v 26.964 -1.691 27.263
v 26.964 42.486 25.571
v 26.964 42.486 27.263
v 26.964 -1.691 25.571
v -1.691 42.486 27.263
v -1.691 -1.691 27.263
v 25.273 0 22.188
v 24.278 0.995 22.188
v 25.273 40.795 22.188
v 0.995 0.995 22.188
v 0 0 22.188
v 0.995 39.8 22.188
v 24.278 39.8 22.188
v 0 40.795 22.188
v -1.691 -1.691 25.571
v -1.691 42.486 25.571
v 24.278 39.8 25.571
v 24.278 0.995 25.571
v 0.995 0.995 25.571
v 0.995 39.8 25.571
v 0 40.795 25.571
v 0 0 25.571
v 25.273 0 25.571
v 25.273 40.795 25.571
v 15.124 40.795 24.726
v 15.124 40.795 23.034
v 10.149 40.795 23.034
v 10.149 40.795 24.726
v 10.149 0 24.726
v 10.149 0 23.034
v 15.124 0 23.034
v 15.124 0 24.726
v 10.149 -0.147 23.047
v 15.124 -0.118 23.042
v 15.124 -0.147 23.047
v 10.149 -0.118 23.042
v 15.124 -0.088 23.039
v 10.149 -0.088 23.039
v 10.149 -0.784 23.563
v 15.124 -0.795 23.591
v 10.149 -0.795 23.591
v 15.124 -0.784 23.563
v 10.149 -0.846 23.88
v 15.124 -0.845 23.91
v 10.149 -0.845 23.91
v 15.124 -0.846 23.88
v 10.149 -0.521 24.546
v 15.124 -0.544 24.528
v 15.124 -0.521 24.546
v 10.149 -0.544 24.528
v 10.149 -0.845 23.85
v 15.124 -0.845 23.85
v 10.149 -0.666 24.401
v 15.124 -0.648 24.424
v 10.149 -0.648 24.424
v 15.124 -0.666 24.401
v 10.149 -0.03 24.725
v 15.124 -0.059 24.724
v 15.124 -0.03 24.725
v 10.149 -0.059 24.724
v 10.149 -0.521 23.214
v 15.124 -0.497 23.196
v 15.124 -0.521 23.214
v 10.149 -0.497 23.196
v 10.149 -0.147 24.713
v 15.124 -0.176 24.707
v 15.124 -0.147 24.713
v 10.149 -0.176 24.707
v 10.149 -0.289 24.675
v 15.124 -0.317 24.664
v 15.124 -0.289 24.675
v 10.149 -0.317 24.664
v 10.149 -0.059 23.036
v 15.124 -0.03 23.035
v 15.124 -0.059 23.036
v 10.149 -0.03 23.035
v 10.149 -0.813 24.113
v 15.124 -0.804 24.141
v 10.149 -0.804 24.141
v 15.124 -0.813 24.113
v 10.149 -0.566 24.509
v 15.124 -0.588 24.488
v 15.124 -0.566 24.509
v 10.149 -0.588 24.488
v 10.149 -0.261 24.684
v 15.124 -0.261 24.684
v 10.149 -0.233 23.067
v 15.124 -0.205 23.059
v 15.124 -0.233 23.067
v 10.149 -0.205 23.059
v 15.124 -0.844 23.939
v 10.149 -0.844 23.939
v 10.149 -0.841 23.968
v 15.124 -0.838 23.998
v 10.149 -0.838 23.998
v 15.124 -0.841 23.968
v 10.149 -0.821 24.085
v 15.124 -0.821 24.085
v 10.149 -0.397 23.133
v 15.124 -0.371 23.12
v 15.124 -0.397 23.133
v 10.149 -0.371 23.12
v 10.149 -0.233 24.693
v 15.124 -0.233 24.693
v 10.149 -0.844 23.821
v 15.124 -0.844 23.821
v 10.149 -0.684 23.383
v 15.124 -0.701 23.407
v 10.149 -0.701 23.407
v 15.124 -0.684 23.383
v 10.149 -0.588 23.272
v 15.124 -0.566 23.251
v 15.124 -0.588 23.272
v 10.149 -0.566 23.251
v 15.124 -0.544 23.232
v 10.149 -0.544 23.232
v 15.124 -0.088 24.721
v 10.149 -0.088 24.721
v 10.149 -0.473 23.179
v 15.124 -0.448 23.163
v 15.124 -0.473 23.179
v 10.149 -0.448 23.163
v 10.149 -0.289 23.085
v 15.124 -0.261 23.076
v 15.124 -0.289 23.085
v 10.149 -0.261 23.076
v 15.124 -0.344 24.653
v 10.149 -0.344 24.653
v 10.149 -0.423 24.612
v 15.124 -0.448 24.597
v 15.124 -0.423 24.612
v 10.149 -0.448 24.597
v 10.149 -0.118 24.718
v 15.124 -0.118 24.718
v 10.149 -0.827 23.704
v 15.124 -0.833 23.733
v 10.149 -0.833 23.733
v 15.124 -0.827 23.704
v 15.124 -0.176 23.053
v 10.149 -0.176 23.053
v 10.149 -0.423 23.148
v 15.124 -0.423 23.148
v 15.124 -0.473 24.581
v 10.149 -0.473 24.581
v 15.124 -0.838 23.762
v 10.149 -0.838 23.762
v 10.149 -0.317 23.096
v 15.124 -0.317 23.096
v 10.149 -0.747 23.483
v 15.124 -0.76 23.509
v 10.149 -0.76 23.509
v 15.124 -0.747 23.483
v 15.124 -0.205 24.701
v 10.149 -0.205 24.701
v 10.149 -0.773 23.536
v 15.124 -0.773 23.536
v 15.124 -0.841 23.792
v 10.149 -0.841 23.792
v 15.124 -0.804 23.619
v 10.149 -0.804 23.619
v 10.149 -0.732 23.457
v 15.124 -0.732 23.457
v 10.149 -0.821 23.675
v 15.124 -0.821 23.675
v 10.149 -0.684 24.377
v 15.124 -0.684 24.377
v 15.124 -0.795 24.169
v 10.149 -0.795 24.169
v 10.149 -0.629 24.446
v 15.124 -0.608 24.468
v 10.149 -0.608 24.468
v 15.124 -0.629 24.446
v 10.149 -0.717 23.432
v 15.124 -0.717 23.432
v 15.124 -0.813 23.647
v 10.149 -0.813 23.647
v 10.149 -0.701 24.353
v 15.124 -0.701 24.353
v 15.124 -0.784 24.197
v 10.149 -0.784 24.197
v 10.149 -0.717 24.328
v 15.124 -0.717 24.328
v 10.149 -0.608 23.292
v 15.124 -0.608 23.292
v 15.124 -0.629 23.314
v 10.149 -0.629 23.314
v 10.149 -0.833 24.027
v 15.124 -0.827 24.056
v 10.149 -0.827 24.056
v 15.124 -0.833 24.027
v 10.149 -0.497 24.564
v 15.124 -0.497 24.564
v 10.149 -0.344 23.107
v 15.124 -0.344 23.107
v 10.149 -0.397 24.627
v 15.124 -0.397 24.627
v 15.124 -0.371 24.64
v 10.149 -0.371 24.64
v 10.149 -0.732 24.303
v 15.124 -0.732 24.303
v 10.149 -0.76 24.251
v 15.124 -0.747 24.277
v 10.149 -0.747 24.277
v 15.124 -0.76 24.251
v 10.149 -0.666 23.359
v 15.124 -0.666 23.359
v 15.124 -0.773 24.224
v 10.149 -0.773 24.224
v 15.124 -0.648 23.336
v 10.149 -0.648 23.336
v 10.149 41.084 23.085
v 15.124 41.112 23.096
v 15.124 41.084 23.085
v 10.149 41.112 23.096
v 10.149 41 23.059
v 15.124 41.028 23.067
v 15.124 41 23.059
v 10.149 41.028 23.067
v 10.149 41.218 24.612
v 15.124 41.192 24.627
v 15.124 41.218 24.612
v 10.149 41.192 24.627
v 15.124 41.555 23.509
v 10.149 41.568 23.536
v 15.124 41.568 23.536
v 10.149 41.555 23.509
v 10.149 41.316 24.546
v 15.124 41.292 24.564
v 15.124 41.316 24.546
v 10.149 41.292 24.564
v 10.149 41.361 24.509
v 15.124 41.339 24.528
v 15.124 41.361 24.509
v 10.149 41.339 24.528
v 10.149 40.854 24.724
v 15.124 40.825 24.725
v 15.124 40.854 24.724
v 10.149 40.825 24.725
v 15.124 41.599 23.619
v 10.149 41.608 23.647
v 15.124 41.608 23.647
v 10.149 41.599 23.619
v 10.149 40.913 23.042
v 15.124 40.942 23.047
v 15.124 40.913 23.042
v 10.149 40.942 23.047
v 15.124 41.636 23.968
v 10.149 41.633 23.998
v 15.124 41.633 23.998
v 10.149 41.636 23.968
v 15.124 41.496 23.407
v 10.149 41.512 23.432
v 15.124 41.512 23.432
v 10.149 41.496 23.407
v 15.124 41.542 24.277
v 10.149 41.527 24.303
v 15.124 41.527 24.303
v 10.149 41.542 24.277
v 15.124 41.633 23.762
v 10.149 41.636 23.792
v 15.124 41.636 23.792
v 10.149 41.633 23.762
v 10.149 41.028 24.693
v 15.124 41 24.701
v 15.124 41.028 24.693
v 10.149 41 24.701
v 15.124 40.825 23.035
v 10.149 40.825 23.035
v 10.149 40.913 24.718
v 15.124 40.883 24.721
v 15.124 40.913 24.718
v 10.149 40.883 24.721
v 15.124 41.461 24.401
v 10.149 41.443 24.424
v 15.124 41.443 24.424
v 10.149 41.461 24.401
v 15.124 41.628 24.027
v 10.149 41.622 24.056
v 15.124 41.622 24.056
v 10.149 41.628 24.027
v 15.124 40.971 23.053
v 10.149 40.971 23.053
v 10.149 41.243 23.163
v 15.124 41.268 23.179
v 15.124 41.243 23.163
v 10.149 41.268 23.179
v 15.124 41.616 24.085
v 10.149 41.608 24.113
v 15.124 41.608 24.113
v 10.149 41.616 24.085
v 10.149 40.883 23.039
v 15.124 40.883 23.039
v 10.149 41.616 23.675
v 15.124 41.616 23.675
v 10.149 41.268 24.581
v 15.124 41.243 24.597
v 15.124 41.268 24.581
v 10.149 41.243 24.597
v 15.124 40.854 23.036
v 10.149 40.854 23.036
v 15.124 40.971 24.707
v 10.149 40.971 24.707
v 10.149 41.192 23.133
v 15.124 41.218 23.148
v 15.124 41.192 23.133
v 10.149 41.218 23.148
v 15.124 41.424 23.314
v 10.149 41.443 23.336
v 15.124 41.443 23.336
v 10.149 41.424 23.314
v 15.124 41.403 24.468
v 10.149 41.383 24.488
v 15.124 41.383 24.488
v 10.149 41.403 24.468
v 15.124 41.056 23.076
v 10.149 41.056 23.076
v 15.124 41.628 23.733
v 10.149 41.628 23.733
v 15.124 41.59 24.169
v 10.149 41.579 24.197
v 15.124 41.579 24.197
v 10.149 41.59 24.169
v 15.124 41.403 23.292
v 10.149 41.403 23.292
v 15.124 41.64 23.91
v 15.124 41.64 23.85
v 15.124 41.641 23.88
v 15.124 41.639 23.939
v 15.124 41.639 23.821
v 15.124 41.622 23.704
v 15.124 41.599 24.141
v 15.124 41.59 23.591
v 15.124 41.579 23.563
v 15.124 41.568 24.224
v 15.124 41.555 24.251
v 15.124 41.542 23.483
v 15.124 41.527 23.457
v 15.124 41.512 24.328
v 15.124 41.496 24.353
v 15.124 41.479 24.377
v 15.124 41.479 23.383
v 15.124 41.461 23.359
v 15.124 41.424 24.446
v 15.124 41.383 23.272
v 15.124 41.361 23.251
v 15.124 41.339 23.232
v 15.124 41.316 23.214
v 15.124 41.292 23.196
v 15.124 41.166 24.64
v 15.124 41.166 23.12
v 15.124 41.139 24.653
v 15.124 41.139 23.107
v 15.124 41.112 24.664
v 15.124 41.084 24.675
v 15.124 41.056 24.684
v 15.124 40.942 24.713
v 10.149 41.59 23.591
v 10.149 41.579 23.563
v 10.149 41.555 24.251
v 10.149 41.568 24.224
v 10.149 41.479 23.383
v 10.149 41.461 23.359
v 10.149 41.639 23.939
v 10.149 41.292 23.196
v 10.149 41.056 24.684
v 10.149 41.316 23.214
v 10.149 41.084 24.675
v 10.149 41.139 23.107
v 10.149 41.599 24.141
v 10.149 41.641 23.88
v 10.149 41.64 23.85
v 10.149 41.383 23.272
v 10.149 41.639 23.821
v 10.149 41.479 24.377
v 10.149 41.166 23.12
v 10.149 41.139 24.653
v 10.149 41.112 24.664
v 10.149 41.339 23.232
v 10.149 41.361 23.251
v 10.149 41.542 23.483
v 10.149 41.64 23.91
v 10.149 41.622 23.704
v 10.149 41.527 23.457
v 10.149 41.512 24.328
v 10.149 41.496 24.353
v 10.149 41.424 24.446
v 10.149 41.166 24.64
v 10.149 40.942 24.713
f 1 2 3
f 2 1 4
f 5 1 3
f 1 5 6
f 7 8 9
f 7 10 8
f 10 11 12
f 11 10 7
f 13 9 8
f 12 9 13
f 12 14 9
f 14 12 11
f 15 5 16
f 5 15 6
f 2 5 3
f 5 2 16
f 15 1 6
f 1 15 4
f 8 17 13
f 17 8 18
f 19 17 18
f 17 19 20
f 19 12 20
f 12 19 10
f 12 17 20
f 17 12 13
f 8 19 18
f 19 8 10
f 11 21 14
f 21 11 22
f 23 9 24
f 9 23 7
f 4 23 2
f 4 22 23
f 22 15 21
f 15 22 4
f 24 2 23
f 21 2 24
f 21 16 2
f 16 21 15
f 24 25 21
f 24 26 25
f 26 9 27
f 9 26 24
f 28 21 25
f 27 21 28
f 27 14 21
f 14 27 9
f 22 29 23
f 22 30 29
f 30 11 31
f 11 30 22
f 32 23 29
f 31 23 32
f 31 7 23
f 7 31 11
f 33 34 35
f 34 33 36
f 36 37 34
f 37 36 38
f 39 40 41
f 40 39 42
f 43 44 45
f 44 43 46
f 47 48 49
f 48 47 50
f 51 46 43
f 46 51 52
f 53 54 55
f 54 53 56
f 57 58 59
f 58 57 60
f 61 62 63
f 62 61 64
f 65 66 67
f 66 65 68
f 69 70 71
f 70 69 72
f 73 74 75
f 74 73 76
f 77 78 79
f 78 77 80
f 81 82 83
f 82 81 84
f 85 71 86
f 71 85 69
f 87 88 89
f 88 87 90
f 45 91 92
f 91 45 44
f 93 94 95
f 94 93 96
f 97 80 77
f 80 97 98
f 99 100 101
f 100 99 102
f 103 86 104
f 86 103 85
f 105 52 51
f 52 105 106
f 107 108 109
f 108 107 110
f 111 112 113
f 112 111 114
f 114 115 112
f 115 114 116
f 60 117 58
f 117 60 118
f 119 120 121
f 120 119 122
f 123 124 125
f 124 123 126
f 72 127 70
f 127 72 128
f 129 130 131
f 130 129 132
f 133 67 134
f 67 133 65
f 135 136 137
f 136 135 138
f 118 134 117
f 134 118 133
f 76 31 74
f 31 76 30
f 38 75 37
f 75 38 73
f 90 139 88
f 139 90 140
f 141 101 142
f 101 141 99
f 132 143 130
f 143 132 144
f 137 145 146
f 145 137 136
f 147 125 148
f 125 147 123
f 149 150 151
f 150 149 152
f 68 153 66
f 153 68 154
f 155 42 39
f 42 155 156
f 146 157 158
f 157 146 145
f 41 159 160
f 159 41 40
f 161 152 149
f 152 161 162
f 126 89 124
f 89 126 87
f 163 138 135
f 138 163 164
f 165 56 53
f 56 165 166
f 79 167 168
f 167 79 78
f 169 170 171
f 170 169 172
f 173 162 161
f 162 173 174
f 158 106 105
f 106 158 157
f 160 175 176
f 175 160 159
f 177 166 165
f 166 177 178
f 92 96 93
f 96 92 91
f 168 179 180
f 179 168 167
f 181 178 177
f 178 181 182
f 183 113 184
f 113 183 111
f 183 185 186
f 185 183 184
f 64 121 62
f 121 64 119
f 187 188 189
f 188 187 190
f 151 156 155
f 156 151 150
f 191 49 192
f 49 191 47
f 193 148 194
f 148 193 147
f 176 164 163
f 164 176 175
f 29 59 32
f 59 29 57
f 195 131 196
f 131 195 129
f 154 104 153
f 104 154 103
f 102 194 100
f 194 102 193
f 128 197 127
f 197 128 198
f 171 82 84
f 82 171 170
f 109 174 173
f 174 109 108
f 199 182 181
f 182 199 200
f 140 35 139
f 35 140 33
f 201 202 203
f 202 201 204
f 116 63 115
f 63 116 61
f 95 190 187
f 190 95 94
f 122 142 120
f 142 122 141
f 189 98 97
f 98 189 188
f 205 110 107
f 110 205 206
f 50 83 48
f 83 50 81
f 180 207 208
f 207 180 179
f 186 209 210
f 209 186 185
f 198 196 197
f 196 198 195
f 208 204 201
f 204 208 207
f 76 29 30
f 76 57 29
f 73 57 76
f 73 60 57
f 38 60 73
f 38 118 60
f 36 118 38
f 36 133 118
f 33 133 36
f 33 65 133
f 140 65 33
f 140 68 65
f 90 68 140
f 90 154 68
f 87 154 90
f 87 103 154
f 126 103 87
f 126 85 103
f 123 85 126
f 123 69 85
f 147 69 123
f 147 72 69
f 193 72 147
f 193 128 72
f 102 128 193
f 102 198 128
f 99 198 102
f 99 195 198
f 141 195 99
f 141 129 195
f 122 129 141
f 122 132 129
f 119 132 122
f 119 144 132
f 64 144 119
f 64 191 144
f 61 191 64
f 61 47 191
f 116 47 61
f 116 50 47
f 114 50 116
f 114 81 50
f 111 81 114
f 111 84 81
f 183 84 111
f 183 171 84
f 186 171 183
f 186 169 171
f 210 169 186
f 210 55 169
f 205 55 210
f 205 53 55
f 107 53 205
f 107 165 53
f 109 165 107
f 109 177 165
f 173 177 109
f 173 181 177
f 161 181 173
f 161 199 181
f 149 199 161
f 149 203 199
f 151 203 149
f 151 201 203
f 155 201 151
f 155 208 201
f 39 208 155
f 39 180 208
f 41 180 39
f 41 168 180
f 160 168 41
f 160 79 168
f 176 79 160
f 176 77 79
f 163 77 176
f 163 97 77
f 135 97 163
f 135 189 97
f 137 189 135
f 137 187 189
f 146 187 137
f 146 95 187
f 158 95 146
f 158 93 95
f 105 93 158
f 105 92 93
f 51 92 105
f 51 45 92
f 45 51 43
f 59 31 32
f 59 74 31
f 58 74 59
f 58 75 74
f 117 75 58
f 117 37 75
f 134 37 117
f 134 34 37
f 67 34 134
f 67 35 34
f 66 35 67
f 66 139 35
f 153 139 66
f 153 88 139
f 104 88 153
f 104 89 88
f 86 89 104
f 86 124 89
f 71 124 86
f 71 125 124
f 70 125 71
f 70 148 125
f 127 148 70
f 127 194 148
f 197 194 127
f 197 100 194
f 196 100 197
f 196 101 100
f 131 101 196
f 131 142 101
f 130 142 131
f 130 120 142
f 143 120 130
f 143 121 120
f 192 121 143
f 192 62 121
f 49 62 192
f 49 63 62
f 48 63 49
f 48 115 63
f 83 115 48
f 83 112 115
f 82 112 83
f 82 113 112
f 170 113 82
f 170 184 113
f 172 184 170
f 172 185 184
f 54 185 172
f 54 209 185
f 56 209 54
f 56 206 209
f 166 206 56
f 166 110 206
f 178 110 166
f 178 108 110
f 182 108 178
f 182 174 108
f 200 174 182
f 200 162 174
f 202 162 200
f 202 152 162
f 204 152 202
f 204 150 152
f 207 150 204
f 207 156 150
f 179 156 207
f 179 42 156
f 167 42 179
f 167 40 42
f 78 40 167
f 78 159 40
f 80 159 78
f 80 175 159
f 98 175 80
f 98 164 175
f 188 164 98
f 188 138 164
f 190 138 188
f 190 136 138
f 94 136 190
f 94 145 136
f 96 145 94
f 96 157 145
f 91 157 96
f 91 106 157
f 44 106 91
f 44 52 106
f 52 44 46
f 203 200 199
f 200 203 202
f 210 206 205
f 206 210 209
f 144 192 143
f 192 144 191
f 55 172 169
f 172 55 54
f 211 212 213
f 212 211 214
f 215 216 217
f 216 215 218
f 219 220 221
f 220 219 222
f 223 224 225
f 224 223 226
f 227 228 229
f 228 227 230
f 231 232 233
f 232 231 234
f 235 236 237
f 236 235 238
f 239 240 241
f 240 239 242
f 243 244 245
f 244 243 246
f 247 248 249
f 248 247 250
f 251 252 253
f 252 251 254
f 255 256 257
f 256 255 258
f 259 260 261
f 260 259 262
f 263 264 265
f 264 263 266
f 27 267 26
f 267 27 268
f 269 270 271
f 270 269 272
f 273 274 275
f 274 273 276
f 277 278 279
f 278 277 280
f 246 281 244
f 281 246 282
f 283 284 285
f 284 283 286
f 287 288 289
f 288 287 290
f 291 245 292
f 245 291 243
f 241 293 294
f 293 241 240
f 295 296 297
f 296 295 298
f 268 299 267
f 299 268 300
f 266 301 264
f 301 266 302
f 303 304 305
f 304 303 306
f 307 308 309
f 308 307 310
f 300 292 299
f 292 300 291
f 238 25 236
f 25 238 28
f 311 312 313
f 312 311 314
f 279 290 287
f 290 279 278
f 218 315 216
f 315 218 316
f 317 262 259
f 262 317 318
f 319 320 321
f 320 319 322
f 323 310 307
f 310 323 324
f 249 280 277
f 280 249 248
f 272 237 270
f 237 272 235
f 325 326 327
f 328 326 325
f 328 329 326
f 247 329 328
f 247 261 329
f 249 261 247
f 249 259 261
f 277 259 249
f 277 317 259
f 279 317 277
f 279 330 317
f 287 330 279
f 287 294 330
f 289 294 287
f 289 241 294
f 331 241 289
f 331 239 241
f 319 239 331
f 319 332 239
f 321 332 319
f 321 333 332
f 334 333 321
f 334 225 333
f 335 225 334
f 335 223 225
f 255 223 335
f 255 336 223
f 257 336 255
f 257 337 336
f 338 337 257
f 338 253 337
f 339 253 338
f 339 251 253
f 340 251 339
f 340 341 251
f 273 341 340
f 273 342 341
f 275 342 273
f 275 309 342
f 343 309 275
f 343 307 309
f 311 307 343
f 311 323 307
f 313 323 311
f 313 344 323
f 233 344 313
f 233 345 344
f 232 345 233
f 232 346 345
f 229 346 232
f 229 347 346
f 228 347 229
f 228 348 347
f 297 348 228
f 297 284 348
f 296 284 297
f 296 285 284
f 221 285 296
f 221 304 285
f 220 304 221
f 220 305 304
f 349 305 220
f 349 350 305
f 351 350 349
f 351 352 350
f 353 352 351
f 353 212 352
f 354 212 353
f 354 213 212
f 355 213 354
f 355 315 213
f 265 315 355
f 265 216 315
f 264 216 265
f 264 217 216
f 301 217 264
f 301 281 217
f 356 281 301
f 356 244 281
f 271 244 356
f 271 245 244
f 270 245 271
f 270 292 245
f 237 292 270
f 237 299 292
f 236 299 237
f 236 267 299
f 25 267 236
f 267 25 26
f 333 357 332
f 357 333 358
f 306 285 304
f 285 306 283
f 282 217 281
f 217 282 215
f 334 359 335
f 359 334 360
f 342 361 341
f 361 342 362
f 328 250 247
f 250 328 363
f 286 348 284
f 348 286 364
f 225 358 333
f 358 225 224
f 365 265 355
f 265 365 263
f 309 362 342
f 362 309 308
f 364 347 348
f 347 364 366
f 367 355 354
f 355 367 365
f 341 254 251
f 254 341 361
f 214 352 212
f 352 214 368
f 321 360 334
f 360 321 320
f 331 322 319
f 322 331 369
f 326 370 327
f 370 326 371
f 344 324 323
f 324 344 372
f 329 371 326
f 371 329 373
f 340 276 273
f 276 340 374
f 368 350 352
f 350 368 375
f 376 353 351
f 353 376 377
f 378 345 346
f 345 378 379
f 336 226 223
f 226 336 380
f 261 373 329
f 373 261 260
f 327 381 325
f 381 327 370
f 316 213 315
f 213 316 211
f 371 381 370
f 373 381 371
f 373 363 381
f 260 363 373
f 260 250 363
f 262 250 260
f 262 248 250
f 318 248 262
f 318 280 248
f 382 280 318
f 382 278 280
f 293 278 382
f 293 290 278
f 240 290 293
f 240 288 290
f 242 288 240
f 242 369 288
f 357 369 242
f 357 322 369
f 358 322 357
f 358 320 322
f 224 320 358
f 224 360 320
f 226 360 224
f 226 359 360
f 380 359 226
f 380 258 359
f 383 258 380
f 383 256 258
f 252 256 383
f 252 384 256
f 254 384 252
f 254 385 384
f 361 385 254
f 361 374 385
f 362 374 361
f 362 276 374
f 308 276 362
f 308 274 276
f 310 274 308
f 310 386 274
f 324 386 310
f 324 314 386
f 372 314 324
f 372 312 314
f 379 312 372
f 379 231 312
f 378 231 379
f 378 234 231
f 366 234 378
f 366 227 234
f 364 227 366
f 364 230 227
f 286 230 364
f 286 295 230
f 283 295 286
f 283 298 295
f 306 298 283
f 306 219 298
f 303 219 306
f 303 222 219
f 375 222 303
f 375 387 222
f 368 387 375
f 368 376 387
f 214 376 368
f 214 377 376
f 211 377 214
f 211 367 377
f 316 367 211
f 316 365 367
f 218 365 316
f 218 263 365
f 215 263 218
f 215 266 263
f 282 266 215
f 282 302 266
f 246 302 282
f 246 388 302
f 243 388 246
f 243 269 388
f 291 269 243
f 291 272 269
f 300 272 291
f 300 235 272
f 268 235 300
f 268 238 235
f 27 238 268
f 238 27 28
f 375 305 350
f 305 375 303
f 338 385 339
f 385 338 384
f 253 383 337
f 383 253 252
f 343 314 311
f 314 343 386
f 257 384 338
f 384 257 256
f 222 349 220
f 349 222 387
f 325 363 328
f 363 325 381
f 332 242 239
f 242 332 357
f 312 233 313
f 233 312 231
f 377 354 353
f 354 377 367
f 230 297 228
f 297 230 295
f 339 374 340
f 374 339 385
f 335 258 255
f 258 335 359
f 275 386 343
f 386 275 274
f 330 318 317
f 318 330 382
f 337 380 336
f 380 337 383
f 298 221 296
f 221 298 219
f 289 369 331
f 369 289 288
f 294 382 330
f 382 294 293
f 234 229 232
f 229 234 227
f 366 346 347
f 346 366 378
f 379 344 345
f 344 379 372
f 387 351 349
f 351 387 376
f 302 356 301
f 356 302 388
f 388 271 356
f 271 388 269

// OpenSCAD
$fn=180;
//$fn=80;

board_height = 5;
board_thickness = 1.1;

width = 25.4; //28
length = 41; //41
height = 24;
wall_thickness = 1.7;


ir_sensor_r = 9.3/2;//9/2, 9.6/2

antenna_r = (9.3/2) + 0.4;
antenna_r2 = (6.3/2) + 0.2;

usb_c_w = 9.2;//8.45;
usb_c_h = 3.5;//2.65;

antenna_len = 5;

snap_r = 1; // 1

cover_len = length+ 0;
cover_wall_thickness = 1;

draw_cover = true;


module cover(error=0.0)
{        
    translate([0,0,height])
    {
    cube(size = [width, cover_len, wall_thickness], center = false);
    }
    
    fin_r1 = (wall_thickness/2)/2;
    //fin_h = 10;
    
    h1 = height + wall_thickness/2;
    
    
    fin_s = wall_thickness;
    fin_len = 3 - 2*error;
    fin_h = wall_thickness/2 - error;
    
   
    translate([-fin_s,cover_len/3 + error,height])
    {
    cube(size = [fin_s, fin_len, fin_h], center = false);
    }
    
    translate([-fin_s,cover_len - cover_len/3 + error,height])
    {
    cube(size = [fin_s, fin_len, fin_h], center = false);
    }
    
    translate([width,cover_len/3 + error,height])
    {
    cube(size = [fin_s, fin_len, fin_h], center = false);
    }
    
    translate([width,cover_len - cover_len/3 + error,height])
    {
    cube(size = [fin_s, fin_len, fin_h], center = false);
    }
    
    
    translate([width/2 - fin_len/2,-fin_s,height])
    {
    cube(size = [fin_len, fin_s, fin_h], center = false);
    }
    
    translate([width/2 - fin_len/2,cover_len,height])
    {
    cube(size = [fin_len, fin_s, fin_h], center = false);
    }

}

module inner_legs()
{
    inner_leg_w = 2;
    inner_leg_h = height;
    
    cube(size = [inner_leg_w, inner_leg_w, inner_leg_h], center = false);
    
    translate([width - inner_leg_w,0,0])
    {
    cube(size = [inner_leg_w, inner_leg_w, inner_leg_h], center = false);
    }
    
    translate([width - inner_leg_w, length - inner_leg_w,0])
    {
    cube(size = [inner_leg_w, inner_leg_w, inner_leg_h], center = false);
    }
    
    translate([0, length - inner_leg_w,0])
    {
    cube(size = [inner_leg_w, inner_leg_w, inner_leg_h], center = false);
    }
}

module usb_buttons_holes()
{
    translate([width/2 - usb_c_w/2, length - 1, board_height + board_thickness])
    {   
        r_m = 1;
         translate([r_m, 0, r_m])
        {   
            minkowski(){
                
            cube(size = [usb_c_w-2*r_m, 30, usb_c_h-2*r_m], center = false);
                sphere(r_m);
            }
        }        
        
        //cube(size = [usb_c_w, 30, usb_c_h], center = false);
    }    
}

module ir_sensor()
{
    ir_sensor_r2 = ir_sensor_r+1;
    translate([width/2,0, board_height + board_thickness+ir_sensor_r2+snap_r+3-(ir_sensor_r2-ir_sensor_r)])
{
rotate([90,0,0])
        {
    cylinder(h=wall_thickness+5, r1=ir_sensor_r2, r2=ir_sensor_r2, center=false);
        }
    }
}

module ir_sensor_cut()
{
    translate([width/2,0, board_height + board_thickness+ir_sensor_r+snap_r+3])
{
rotate([90,0,0])
        {
    cylinder(h=10, r1=ir_sensor_r, r2=ir_sensor_r, center=false);
        }
    }
}

module antenna_holder_cut()
{
    rotate([-90,0,90])
        {   
            translate([20 + wall_thickness, -(height/2) - 4, 0])
            {
                cylinder(h=antenna_len-wall_thickness, r1=antenna_r, r2=antenna_r, center=false, $fn=6);
                
                cylinder(h=antenna_len*2, r1=antenna_r2, r2=antenna_r2, center=false);
            }
        }
}    

module antenna_holder()
{
    rotate([-90,0,90])
        {
            antenna_r1 = antenna_r + wall_thickness/2;
            antenna_len1 = antenna_len + wall_thickness;
            translate([20 + wall_thickness, -(height/2) - 4, 0])
            {
                cylinder(h=antenna_len, r1=antenna_r1, r2=antenna_r1, center=false);
            }
        }
}    

module button_cut1()
{
    btn_r = 3/2;
    cut_thickness = 0.5;
    len = 8*btn_r;
    wid = 3*btn_r;
    // cut around the cylinder    
    translate([width-5, length - len - 4, board_height])
    {
        difference()
        {
            translate([0, cut_thickness, -(cut_thickness)])
            {
                cube(size = [10, len, wid + 2*cut_thickness], center = false);        
            }
        
            cube(size = [10, len, wid], center = false);        
        }
    }       
}


module button_cut()
{
    btn_r = 3/2;
    cut_thickness = 0.5;
    len = 6*btn_r;
    wid = 3*btn_r;
    // cut around the cylinder    
    translate([width-5, length - wid - 3, board_height - len + wall_thickness + 2])
    {
        difference()
        {
            translate([0, -(cut_thickness), cut_thickness])
            {
                cube(size = [10, wid + 2*cut_thickness, len], center = false);        
            }
        
            cube(size = [10, wid, len], center = false);        
        }
    }       
}


module board_snap()
{
   
    translate([0,0, board_height - snap_r])
    {
    rotate([0,90,0])
        {
    cylinder(h=width, r1=snap_r, r2=snap_r, center=false);
        }
    }
    
    translate([0,0, board_height + board_thickness + snap_r])
    {
    rotate([0,90,0])
        {
    //cylinder(h=width, r1=snap_r, r2=snap_r, center=false);
        }
    }
    
    
    translate([0,length, board_height - snap_r])
    {
    rotate([0,90,0])
        {
    cylinder(h=width, r1=snap_r, r2=snap_r, center=false);
        }
    }
}


module box0()
{
    union()
    {
    
    board_snap();   
    
    antenna_holder();
        
        ir_sensor();
        
        //inner_legs();
        
     
    
    difference()
{
    
    union()
    {
    translate([ -wall_thickness, -wall_thickness, -wall_thickness])
    {
cube(size = [width + 2*wall_thickness, length + 2*wall_thickness, height + 2*wall_thickness], center = false);
    }  
    }
    
    
    union()
    {
   cube(size = [width, length, height + 10], center = false);
    }
    
}
}
}

module cover1()
{
    
    difference()
    {
    translate([-wall_thickness, -wall_thickness, height-1*wall_thickness])
{
    cube(size = [width+2*wall_thickness, length + 2*wall_thickness, 3*wall_thickness], center = false);    
}

translate([cover_wall_thickness, cover_wall_thickness, height-1*wall_thickness])

    cube(size = [width-2*cover_wall_thickness, 
                length-2*cover_wall_thickness, 
                2*wall_thickness], center = false);
}

}





module all()
{
    union()
    {
        ir_sensor_cut();
        usb_buttons_holes();
        antenna_holder_cut();
        cover_snaps();
        button_cut();
    }
}


module cover_snaps()
{
snap_rd = wall_thickness/2;
snap_len = 5;
translate([width/2 - snap_len/2,0, height ])
    {
    rotate([0,90,0])
        {
    cylinder(h=5, r1=snap_rd, r2=snap_rd, center=false);
        }
    }
    
translate([width/2 - snap_len/2,length, height ])
    {
    rotate([0,90,0])
        {
    cylinder(h=5, r1=snap_rd, r2=snap_rd, center=false);
        }
    }
}

if(draw_cover)
{    
    scale_ratio = 0.995;
    scale([scale_ratio, scale_ratio, scale_ratio])
    {
        difference()
        {
            cover1();
            box0();    
        }
        cover_snaps();
    }    
}else
{
    difference()
    {
        box0();    
        all();
    }
}








    
